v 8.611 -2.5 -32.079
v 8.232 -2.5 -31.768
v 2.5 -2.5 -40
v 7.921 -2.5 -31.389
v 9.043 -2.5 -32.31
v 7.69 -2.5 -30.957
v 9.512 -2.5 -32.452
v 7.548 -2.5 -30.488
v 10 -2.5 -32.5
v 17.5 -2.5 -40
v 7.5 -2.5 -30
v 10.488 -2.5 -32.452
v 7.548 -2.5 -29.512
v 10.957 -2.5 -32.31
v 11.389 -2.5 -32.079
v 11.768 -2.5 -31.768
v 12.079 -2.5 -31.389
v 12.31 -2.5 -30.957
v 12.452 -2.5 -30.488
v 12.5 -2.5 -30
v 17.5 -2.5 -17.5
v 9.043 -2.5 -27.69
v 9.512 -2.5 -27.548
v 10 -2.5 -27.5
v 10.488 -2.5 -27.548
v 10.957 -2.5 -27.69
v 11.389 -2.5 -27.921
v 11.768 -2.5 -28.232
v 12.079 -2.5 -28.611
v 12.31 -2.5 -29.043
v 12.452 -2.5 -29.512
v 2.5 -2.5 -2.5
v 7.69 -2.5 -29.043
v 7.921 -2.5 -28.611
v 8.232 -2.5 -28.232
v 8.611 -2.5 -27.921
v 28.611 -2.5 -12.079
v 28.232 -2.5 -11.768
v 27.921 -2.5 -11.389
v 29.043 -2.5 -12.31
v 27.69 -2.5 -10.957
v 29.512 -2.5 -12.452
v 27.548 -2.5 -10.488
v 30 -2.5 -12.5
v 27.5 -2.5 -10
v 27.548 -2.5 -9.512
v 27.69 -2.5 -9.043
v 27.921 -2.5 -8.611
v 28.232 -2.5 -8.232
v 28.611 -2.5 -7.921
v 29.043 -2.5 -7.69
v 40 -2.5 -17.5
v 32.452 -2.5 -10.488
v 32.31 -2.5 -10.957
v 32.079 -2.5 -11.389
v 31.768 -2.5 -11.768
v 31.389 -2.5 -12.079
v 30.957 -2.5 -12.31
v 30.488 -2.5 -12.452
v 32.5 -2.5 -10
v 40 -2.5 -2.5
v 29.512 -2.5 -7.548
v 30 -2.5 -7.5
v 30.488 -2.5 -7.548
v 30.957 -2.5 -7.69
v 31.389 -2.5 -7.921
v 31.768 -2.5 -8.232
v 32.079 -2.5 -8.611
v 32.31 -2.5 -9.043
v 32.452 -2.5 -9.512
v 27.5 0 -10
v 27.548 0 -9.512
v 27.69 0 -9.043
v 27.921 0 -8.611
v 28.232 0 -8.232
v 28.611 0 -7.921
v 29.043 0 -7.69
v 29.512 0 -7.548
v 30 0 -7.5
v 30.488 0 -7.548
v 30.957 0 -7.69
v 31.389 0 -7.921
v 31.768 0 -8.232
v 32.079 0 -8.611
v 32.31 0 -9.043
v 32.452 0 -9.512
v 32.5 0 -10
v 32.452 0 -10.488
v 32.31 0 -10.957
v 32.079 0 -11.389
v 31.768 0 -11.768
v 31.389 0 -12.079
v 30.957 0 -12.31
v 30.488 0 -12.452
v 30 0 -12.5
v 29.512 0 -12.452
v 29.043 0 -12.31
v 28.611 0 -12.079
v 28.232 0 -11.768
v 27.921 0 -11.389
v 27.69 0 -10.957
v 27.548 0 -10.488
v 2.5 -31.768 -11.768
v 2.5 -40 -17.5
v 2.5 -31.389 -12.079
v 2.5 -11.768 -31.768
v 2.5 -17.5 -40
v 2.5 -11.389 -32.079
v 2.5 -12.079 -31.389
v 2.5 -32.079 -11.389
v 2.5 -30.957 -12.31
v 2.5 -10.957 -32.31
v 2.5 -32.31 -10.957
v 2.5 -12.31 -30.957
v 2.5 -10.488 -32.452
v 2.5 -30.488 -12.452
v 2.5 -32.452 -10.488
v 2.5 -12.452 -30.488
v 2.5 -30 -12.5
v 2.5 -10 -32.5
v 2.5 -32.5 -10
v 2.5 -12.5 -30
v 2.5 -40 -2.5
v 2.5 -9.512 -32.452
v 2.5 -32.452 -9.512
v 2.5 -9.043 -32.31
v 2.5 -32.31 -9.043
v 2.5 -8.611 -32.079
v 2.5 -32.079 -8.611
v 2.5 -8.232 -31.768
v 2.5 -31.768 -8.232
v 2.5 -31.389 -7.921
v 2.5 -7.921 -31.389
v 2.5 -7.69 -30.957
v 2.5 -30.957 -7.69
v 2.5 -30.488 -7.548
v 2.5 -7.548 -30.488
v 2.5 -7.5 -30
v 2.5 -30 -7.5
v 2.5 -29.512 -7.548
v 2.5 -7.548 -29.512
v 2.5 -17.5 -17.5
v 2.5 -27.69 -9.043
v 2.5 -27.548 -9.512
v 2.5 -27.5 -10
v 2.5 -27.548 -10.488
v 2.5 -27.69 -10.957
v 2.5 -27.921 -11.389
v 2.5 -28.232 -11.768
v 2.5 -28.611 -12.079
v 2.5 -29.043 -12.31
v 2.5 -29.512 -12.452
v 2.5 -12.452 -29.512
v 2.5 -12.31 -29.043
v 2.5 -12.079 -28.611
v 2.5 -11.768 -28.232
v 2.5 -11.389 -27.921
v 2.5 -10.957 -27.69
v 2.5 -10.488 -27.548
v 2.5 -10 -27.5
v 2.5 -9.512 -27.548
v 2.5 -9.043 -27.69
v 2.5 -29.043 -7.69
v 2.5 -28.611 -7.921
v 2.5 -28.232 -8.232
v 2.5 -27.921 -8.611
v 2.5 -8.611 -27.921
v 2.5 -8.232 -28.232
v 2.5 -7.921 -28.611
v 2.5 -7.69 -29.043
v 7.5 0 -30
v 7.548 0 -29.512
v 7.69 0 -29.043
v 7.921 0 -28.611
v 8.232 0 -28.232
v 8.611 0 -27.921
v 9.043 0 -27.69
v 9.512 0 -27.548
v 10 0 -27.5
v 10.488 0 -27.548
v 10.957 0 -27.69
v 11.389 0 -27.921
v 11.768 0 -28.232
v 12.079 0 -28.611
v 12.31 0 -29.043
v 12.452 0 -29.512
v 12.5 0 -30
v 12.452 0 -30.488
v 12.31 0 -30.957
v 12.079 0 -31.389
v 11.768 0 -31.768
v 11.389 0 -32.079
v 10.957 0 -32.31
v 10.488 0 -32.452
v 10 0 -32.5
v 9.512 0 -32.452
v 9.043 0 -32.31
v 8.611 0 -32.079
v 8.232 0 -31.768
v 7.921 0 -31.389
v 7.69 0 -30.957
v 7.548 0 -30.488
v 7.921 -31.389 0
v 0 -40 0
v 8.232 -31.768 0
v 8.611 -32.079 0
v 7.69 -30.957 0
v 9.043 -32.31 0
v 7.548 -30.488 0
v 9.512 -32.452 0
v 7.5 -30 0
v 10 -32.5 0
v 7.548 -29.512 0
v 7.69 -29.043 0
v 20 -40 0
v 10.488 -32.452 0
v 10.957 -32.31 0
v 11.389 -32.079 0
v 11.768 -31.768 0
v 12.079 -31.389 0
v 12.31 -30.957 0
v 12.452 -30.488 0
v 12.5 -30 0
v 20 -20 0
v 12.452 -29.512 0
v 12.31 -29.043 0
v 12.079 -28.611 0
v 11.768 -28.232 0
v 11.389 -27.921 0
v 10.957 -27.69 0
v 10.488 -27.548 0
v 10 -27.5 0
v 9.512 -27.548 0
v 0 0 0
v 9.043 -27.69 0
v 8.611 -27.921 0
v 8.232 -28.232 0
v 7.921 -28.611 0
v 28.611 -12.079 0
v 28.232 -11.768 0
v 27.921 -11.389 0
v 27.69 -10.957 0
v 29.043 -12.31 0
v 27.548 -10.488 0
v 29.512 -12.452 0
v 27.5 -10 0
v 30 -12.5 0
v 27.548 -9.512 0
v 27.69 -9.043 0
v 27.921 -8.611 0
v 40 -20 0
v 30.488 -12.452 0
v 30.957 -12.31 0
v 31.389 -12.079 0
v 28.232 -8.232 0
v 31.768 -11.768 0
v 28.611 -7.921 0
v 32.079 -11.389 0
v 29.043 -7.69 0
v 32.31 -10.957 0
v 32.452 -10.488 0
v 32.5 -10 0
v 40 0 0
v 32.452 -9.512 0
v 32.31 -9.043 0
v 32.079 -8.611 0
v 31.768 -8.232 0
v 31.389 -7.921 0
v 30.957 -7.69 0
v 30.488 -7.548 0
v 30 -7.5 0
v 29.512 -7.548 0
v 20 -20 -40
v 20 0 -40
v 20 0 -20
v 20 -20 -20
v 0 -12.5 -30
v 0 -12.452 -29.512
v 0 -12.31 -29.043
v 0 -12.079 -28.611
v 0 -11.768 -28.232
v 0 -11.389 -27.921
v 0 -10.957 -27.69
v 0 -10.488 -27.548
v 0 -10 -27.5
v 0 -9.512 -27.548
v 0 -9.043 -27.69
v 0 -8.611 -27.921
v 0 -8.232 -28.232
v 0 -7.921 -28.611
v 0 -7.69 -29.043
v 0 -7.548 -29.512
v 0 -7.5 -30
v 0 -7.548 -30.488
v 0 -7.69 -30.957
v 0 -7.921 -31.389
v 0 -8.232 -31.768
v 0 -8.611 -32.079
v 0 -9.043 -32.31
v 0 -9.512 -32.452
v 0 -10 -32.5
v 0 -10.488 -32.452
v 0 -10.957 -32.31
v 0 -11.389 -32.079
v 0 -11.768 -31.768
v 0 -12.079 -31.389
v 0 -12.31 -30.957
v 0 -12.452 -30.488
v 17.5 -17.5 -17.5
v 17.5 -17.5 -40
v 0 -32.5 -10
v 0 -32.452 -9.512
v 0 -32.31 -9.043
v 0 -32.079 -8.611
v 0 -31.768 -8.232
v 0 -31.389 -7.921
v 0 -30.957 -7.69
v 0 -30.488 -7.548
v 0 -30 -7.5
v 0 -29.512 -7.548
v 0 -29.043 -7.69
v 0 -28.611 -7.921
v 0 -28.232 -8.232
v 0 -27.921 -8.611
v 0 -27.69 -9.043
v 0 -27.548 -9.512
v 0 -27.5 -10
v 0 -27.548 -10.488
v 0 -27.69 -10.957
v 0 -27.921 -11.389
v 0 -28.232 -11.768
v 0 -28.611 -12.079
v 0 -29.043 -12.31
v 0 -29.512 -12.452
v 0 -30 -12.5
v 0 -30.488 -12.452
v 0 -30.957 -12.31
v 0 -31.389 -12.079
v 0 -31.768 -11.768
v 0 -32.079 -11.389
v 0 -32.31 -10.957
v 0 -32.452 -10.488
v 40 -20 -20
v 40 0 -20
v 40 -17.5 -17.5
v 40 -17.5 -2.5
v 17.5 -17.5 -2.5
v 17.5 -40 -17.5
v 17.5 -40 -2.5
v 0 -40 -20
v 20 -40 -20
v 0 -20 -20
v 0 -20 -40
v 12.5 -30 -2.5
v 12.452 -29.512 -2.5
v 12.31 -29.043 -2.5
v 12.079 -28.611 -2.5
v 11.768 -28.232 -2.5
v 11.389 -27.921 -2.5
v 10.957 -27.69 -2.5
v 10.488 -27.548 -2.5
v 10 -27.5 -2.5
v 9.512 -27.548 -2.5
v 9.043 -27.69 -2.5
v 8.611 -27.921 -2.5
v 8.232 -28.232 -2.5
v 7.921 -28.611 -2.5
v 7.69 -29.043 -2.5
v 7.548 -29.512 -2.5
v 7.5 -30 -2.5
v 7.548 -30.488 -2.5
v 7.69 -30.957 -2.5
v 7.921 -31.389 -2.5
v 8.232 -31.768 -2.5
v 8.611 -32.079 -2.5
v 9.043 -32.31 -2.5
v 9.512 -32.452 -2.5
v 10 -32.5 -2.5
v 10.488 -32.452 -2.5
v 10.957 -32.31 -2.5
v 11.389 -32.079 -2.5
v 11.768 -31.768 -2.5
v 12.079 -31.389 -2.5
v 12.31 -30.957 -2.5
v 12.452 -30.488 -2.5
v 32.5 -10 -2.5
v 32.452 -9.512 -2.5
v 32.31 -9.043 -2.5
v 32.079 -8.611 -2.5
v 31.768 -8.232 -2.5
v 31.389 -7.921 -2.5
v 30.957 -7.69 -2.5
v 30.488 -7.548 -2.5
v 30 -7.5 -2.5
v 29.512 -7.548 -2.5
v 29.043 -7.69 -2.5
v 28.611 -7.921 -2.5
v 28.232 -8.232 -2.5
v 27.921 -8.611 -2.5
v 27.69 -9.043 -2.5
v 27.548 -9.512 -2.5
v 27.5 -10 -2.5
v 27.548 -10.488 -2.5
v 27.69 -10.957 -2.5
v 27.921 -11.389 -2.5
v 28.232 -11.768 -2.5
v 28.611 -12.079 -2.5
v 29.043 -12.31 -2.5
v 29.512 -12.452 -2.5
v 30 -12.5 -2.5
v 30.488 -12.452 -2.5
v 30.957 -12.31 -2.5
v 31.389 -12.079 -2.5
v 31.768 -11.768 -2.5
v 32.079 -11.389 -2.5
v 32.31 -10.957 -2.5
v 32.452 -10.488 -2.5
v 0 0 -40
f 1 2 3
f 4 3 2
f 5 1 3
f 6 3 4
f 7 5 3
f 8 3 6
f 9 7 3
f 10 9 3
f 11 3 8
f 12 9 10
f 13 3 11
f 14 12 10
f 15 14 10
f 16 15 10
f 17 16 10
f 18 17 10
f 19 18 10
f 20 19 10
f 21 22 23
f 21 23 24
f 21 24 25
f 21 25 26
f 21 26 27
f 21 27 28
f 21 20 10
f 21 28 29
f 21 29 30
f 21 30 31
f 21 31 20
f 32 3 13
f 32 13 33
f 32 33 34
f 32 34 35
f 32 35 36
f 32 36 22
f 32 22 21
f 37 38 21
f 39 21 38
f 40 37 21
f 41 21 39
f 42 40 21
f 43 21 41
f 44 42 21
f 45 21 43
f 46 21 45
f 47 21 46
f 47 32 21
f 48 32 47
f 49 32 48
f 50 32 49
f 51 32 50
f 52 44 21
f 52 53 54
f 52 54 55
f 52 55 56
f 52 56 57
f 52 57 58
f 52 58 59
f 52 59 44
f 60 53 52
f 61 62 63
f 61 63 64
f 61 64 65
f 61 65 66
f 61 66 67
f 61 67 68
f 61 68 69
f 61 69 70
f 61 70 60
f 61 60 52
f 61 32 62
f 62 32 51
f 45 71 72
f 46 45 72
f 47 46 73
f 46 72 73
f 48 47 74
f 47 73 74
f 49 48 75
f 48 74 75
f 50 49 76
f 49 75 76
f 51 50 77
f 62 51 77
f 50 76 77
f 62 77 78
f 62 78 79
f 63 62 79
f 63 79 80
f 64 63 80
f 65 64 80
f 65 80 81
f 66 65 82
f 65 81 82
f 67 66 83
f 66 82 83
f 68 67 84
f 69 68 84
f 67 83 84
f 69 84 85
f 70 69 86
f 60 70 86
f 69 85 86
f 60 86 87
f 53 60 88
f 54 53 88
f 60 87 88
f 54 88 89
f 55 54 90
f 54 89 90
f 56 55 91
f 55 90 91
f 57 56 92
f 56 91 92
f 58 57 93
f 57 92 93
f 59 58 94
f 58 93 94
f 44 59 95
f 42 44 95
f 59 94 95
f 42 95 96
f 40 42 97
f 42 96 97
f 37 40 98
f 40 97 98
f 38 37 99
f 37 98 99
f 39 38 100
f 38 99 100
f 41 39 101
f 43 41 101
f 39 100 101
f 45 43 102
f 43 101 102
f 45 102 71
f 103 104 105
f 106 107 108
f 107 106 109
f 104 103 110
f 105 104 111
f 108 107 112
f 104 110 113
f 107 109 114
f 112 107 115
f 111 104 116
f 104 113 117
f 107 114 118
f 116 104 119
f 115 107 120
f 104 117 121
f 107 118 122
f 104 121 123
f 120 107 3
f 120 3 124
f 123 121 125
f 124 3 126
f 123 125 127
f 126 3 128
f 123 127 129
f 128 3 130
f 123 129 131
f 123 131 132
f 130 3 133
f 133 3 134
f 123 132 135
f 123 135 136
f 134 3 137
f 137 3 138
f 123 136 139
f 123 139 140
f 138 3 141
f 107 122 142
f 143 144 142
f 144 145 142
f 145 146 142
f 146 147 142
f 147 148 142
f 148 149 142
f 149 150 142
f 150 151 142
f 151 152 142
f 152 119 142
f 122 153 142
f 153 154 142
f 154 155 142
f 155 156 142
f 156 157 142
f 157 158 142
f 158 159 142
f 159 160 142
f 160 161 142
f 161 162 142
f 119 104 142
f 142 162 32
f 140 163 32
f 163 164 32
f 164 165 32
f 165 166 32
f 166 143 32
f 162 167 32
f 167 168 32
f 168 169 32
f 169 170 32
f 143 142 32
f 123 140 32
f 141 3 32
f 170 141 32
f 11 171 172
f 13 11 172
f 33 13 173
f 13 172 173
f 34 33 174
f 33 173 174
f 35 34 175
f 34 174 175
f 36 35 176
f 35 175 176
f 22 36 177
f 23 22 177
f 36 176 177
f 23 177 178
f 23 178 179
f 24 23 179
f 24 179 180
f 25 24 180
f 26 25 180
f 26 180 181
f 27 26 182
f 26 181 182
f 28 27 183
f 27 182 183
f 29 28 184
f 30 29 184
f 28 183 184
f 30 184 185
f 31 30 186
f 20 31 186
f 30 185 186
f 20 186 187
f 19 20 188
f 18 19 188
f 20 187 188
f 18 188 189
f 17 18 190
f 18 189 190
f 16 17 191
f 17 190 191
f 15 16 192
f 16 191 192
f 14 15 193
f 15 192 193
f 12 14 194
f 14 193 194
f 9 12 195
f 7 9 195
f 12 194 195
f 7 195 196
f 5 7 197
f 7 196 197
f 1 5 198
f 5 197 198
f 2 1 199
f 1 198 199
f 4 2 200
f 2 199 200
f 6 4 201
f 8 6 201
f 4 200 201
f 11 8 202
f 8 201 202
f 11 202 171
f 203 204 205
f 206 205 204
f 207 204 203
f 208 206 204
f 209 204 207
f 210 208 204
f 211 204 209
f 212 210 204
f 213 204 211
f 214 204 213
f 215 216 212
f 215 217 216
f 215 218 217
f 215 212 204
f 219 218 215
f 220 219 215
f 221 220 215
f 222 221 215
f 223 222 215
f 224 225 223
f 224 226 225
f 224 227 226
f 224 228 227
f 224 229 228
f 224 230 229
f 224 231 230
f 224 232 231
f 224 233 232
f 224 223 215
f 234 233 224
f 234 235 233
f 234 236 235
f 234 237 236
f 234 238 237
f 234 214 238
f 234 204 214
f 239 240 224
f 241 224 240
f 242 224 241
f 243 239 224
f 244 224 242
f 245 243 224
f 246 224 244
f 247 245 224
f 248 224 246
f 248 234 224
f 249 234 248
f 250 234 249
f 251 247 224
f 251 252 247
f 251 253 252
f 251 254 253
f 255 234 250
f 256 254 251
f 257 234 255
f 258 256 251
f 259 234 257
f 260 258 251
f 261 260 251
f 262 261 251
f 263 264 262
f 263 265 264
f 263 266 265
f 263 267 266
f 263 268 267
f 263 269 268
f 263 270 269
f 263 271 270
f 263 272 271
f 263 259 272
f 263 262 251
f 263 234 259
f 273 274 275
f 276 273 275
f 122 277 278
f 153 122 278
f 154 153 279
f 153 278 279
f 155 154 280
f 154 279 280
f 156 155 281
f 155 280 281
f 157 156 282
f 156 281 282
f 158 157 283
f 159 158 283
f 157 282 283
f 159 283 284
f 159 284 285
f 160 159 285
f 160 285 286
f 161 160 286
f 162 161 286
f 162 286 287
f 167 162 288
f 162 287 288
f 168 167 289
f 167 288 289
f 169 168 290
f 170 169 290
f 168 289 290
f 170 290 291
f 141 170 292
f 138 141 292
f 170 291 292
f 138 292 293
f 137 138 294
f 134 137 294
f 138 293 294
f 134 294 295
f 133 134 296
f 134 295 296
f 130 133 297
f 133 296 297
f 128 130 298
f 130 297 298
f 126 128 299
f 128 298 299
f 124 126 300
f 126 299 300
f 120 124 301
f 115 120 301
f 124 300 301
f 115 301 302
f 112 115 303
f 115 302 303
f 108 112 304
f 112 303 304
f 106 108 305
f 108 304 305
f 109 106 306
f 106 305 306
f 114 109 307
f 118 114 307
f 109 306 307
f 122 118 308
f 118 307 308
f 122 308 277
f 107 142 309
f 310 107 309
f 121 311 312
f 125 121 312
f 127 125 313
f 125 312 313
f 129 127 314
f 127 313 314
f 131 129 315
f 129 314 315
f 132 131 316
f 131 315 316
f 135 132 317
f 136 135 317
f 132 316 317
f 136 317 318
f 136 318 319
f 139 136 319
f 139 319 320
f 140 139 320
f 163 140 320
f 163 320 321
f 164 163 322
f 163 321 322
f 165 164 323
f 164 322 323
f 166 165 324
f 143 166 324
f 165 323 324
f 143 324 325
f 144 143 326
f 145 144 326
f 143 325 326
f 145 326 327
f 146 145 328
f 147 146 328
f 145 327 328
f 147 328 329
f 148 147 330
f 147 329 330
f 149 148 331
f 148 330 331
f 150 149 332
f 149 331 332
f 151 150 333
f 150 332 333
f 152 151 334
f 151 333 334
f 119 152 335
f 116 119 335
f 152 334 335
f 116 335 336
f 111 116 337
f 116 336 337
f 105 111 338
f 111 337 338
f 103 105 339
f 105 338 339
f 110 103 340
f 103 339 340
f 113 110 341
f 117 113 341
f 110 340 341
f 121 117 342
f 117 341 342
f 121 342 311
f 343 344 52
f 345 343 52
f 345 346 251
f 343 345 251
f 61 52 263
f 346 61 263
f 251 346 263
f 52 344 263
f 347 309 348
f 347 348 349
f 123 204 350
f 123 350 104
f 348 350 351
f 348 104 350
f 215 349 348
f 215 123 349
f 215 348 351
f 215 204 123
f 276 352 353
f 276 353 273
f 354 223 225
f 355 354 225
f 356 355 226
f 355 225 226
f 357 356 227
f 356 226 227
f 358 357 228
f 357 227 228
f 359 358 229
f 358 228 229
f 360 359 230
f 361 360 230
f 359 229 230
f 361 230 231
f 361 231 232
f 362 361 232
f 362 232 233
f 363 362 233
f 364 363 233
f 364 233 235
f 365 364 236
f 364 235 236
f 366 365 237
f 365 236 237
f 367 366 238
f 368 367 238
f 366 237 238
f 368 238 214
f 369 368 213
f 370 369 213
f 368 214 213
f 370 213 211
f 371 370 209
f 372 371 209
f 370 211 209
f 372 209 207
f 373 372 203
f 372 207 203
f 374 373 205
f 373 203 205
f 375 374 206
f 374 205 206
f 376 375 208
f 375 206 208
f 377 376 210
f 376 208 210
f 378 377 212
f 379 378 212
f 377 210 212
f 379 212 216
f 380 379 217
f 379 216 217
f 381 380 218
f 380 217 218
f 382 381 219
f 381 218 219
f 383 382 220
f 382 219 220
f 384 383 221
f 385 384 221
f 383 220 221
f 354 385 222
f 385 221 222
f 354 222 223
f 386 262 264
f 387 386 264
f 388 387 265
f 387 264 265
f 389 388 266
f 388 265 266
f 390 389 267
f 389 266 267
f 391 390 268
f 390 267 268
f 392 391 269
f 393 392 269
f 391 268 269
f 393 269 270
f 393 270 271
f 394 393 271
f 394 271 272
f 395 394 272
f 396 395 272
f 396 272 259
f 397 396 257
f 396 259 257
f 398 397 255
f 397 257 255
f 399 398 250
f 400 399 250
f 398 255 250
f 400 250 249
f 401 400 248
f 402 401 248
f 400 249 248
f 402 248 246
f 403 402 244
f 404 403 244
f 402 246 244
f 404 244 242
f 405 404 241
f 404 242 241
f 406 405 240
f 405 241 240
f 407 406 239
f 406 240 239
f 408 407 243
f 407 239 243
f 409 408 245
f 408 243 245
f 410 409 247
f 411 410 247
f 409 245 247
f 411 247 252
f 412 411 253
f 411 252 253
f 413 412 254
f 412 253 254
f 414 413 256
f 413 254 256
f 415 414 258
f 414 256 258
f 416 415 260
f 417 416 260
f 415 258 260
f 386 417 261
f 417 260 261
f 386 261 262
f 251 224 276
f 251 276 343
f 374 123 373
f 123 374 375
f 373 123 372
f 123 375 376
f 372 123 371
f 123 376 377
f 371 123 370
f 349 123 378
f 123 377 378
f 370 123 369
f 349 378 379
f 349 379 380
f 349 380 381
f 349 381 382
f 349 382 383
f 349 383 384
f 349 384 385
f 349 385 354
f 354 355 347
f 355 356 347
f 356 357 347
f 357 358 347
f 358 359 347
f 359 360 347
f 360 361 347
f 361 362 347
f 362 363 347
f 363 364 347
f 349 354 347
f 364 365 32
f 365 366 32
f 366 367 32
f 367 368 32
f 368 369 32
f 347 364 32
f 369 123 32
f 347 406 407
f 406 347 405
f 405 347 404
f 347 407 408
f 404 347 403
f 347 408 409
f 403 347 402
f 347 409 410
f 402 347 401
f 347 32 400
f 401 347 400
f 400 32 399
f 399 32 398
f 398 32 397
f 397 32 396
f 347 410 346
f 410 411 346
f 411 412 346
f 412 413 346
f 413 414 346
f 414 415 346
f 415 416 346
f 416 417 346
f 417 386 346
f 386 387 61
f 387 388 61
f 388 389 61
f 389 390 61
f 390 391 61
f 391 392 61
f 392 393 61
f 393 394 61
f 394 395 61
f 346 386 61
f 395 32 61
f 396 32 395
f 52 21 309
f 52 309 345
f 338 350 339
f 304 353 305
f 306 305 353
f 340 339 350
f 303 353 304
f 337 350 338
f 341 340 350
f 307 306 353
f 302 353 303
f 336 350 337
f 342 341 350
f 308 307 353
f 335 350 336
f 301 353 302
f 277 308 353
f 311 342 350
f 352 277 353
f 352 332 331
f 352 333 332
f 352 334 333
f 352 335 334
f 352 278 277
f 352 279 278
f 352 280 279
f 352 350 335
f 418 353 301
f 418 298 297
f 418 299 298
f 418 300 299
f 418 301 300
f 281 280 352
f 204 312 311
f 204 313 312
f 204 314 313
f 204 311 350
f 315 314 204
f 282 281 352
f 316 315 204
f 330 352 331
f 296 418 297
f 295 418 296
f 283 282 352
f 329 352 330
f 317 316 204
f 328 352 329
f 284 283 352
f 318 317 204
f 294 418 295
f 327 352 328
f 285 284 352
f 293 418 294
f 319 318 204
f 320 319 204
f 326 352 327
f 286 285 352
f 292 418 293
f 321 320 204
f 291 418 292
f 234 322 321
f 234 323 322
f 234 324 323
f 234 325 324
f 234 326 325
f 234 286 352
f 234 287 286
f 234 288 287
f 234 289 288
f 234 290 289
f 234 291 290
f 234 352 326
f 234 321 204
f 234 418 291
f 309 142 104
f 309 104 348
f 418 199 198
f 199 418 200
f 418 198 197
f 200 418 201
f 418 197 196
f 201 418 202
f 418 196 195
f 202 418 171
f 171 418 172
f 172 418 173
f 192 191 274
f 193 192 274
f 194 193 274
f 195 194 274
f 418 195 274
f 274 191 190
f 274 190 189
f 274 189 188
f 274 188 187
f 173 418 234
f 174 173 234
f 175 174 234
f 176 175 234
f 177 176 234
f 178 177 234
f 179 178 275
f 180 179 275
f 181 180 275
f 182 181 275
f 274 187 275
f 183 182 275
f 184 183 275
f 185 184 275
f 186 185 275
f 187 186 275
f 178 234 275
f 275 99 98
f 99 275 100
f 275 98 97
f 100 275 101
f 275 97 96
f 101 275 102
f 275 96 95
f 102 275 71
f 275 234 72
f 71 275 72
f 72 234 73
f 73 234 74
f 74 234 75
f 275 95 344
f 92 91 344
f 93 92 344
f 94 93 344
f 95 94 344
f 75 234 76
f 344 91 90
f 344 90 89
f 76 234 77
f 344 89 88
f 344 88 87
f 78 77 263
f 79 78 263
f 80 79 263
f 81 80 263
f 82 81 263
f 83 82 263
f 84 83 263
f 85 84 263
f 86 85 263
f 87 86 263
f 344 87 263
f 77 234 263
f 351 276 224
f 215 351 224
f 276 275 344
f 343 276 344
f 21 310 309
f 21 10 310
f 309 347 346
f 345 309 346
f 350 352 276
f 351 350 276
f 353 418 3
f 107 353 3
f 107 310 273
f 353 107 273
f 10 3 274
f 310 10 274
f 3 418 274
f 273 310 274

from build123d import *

# Parameters (mm, degrees)
F1_DEPTH  = 20
F2_W      = 20
F2_H      = 20
F3_DEPTH  = 20
F4_T      = -2.5
F5_R      = 2.5
F6_DEPTH  = 2.5
F7_R      = 2.5
F8_DEPTH  = 2.5
F9_R      = 2.5
F10_DEPTH = 2.5


with BuildPart() as f1:
    # F0 (on Front) → F1 (new body)
    with BuildSketch(Plane.XZ):
        Polygon((40, 0), (0, 0), (0, -40), (20, -40), (20, -20), (40, -20), align=None)
    extrude(amount=F1_DEPTH)

    # F2 (on face) → F3 (join)
    with BuildSketch(Plane.XZ.offset(20)):
        with Locations((10, -10)):
            Rectangle(F2_W, F2_H)
    extrude(amount=F3_DEPTH)

    # F4
    f4_openings = [f1.faces().sort_by_distance(p)[0] for p in [
        (10, -40, -10),
        (40, -10, -10),
        (10, -10, -40),
    ]]
    offset(amount=F4_T, openings=f4_openings, kind=Kind.INTERSECTION)

    # F5 (on face) → F6 (cut, through all)
    with BuildSketch(Plane(origin=(0, 0, 0), x_dir=(0, -1, 0), z_dir=(-1, 0, 0))):
        with Locations((30, -10)):
            Circle(F5_R)
        with Locations((10, -30)):
            Circle(F5_R)
    extrude(amount=-F6_DEPTH, mode=Mode.SUBTRACT)

    # F7 (on face) → F8 (cut, through all)
    with BuildSketch(Plane.XY):
        with Locations((10, -30)):
            Circle(F7_R)
        with Locations((30, -10)):
            Circle(F7_R)
    extrude(amount=-F8_DEPTH, mode=Mode.SUBTRACT)

    # F9 (on face) → F10 (cut, through all)
    with BuildSketch(Plane(origin=(0, 0, 0), x_dir=(-1, 0, 0), z_dir=(0, 1, 0))):
        with Locations((-30, -10)):
            Circle(F9_R)
        with Locations((-10, -30)):
            Circle(F9_R)
    extrude(amount=-F10_DEPTH, mode=Mode.SUBTRACT)


solid = f1.part
